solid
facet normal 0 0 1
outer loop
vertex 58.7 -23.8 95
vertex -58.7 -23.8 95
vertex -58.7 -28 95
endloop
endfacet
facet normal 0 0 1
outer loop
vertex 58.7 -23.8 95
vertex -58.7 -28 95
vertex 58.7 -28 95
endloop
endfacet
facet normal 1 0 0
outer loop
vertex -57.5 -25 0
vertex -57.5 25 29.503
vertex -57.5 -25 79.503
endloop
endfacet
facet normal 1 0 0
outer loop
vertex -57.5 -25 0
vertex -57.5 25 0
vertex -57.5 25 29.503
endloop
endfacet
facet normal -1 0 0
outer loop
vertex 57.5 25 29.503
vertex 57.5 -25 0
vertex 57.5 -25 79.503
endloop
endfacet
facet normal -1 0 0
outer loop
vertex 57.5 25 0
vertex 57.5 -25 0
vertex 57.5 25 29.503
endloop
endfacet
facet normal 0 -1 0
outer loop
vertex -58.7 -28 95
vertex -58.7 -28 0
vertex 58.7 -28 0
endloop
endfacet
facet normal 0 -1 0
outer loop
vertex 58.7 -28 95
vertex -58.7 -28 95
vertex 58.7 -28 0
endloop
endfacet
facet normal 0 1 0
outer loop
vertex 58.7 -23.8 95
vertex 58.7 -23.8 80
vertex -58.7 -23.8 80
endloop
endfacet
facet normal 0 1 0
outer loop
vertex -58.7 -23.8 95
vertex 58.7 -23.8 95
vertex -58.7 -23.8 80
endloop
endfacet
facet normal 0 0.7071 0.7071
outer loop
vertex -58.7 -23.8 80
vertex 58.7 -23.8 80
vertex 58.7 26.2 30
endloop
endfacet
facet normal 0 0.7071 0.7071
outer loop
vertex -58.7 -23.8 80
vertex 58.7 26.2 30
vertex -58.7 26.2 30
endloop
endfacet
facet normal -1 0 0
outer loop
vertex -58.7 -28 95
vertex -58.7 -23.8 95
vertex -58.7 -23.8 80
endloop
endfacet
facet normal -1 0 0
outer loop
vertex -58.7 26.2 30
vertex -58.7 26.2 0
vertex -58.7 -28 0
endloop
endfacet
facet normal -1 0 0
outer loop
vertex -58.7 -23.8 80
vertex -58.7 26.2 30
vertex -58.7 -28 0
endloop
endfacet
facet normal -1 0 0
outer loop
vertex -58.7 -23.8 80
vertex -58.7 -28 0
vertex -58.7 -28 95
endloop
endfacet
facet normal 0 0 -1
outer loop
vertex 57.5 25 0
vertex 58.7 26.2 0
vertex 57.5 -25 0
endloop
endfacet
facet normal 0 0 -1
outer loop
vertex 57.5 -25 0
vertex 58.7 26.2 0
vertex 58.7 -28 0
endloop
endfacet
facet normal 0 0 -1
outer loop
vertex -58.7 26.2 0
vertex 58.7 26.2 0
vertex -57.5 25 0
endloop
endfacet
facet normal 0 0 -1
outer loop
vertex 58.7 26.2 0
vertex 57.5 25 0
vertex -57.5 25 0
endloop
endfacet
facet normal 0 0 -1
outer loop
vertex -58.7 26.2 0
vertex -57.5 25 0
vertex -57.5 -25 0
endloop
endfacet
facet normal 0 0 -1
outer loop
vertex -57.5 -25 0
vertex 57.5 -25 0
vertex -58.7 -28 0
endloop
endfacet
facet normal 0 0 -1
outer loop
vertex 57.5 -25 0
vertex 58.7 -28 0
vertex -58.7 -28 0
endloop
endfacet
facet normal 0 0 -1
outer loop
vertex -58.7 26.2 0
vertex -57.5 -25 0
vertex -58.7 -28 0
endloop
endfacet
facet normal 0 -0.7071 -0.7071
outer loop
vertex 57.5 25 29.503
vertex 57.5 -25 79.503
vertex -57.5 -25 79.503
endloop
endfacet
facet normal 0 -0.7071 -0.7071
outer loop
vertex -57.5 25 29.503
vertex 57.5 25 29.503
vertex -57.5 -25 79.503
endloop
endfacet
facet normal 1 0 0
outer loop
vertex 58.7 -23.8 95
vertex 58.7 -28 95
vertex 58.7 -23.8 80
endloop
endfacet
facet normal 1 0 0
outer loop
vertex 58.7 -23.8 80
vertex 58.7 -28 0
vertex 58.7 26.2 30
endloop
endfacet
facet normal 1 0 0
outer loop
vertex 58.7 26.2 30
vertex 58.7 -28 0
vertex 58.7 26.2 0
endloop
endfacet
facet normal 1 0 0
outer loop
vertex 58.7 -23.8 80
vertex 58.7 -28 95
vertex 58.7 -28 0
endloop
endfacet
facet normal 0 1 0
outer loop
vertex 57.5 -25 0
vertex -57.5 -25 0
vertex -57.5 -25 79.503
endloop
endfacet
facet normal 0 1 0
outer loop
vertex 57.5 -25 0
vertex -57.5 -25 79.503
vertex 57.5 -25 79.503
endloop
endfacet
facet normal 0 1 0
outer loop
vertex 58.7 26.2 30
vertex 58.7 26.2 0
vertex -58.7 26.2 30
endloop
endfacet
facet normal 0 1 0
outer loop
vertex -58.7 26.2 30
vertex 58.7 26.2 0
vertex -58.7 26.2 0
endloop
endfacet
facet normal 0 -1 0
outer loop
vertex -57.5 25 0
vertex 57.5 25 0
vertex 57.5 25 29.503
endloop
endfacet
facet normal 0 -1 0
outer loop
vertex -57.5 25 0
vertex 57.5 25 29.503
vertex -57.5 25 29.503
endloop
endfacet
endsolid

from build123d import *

# Parameters (mm, degrees)
F0_W     = 115
F0_H     = 50
F1_DEPTH = 80
F2_SIZE  = 50
F3_DEPTH = 15
F4_T     = -1.2
F5_DEPTH = 1.8


with BuildPart() as f1:
    # F0 (on Top) → F1 (new body)
    with BuildSketch(Plane.XY):
        Polygon((58.7, -28), (58.7, -25), (58.7, 26.2), (-58.7, 26.2), (-58.7, -25), (-58.7, -28), (-57.5, -28), (57.5, -28), align=None)
        Rectangle(F0_W, F0_H, mode=Mode.SUBTRACT)
        Rectangle(F0_W, F0_H)
    extrude(amount=F1_DEPTH)

    # F2
    f2_edges = [f1.edges().sort_by_distance(p)[0] for p in [
        (0, 26.2, 80),
    ]]
    chamfer(f2_edges, length=F2_SIZE)

    # F3 (add): a face of the model
    f3_faces = [f1.faces().sort_by_distance(p)[0] for p in [
        (0, -25.9, 80),
    ]]
    extrude(f3_faces, amount=F3_DEPTH)

    # F4
    f4_openings = [f1.faces().sort_by_distance(p)[0] for p in [
        (0, -0.9, 0),
    ]]
    offset(amount=F4_T, openings=f4_openings, kind=Kind.INTERSECTION)

    # F5 (add): a face of the model
    f5_faces = [f1.faces().sort_by_distance(p)[0] for p in [
        (0, -26.8, 46.9),
    ]]
    extrude(f5_faces, amount=F5_DEPTH)


solid = f1.part
